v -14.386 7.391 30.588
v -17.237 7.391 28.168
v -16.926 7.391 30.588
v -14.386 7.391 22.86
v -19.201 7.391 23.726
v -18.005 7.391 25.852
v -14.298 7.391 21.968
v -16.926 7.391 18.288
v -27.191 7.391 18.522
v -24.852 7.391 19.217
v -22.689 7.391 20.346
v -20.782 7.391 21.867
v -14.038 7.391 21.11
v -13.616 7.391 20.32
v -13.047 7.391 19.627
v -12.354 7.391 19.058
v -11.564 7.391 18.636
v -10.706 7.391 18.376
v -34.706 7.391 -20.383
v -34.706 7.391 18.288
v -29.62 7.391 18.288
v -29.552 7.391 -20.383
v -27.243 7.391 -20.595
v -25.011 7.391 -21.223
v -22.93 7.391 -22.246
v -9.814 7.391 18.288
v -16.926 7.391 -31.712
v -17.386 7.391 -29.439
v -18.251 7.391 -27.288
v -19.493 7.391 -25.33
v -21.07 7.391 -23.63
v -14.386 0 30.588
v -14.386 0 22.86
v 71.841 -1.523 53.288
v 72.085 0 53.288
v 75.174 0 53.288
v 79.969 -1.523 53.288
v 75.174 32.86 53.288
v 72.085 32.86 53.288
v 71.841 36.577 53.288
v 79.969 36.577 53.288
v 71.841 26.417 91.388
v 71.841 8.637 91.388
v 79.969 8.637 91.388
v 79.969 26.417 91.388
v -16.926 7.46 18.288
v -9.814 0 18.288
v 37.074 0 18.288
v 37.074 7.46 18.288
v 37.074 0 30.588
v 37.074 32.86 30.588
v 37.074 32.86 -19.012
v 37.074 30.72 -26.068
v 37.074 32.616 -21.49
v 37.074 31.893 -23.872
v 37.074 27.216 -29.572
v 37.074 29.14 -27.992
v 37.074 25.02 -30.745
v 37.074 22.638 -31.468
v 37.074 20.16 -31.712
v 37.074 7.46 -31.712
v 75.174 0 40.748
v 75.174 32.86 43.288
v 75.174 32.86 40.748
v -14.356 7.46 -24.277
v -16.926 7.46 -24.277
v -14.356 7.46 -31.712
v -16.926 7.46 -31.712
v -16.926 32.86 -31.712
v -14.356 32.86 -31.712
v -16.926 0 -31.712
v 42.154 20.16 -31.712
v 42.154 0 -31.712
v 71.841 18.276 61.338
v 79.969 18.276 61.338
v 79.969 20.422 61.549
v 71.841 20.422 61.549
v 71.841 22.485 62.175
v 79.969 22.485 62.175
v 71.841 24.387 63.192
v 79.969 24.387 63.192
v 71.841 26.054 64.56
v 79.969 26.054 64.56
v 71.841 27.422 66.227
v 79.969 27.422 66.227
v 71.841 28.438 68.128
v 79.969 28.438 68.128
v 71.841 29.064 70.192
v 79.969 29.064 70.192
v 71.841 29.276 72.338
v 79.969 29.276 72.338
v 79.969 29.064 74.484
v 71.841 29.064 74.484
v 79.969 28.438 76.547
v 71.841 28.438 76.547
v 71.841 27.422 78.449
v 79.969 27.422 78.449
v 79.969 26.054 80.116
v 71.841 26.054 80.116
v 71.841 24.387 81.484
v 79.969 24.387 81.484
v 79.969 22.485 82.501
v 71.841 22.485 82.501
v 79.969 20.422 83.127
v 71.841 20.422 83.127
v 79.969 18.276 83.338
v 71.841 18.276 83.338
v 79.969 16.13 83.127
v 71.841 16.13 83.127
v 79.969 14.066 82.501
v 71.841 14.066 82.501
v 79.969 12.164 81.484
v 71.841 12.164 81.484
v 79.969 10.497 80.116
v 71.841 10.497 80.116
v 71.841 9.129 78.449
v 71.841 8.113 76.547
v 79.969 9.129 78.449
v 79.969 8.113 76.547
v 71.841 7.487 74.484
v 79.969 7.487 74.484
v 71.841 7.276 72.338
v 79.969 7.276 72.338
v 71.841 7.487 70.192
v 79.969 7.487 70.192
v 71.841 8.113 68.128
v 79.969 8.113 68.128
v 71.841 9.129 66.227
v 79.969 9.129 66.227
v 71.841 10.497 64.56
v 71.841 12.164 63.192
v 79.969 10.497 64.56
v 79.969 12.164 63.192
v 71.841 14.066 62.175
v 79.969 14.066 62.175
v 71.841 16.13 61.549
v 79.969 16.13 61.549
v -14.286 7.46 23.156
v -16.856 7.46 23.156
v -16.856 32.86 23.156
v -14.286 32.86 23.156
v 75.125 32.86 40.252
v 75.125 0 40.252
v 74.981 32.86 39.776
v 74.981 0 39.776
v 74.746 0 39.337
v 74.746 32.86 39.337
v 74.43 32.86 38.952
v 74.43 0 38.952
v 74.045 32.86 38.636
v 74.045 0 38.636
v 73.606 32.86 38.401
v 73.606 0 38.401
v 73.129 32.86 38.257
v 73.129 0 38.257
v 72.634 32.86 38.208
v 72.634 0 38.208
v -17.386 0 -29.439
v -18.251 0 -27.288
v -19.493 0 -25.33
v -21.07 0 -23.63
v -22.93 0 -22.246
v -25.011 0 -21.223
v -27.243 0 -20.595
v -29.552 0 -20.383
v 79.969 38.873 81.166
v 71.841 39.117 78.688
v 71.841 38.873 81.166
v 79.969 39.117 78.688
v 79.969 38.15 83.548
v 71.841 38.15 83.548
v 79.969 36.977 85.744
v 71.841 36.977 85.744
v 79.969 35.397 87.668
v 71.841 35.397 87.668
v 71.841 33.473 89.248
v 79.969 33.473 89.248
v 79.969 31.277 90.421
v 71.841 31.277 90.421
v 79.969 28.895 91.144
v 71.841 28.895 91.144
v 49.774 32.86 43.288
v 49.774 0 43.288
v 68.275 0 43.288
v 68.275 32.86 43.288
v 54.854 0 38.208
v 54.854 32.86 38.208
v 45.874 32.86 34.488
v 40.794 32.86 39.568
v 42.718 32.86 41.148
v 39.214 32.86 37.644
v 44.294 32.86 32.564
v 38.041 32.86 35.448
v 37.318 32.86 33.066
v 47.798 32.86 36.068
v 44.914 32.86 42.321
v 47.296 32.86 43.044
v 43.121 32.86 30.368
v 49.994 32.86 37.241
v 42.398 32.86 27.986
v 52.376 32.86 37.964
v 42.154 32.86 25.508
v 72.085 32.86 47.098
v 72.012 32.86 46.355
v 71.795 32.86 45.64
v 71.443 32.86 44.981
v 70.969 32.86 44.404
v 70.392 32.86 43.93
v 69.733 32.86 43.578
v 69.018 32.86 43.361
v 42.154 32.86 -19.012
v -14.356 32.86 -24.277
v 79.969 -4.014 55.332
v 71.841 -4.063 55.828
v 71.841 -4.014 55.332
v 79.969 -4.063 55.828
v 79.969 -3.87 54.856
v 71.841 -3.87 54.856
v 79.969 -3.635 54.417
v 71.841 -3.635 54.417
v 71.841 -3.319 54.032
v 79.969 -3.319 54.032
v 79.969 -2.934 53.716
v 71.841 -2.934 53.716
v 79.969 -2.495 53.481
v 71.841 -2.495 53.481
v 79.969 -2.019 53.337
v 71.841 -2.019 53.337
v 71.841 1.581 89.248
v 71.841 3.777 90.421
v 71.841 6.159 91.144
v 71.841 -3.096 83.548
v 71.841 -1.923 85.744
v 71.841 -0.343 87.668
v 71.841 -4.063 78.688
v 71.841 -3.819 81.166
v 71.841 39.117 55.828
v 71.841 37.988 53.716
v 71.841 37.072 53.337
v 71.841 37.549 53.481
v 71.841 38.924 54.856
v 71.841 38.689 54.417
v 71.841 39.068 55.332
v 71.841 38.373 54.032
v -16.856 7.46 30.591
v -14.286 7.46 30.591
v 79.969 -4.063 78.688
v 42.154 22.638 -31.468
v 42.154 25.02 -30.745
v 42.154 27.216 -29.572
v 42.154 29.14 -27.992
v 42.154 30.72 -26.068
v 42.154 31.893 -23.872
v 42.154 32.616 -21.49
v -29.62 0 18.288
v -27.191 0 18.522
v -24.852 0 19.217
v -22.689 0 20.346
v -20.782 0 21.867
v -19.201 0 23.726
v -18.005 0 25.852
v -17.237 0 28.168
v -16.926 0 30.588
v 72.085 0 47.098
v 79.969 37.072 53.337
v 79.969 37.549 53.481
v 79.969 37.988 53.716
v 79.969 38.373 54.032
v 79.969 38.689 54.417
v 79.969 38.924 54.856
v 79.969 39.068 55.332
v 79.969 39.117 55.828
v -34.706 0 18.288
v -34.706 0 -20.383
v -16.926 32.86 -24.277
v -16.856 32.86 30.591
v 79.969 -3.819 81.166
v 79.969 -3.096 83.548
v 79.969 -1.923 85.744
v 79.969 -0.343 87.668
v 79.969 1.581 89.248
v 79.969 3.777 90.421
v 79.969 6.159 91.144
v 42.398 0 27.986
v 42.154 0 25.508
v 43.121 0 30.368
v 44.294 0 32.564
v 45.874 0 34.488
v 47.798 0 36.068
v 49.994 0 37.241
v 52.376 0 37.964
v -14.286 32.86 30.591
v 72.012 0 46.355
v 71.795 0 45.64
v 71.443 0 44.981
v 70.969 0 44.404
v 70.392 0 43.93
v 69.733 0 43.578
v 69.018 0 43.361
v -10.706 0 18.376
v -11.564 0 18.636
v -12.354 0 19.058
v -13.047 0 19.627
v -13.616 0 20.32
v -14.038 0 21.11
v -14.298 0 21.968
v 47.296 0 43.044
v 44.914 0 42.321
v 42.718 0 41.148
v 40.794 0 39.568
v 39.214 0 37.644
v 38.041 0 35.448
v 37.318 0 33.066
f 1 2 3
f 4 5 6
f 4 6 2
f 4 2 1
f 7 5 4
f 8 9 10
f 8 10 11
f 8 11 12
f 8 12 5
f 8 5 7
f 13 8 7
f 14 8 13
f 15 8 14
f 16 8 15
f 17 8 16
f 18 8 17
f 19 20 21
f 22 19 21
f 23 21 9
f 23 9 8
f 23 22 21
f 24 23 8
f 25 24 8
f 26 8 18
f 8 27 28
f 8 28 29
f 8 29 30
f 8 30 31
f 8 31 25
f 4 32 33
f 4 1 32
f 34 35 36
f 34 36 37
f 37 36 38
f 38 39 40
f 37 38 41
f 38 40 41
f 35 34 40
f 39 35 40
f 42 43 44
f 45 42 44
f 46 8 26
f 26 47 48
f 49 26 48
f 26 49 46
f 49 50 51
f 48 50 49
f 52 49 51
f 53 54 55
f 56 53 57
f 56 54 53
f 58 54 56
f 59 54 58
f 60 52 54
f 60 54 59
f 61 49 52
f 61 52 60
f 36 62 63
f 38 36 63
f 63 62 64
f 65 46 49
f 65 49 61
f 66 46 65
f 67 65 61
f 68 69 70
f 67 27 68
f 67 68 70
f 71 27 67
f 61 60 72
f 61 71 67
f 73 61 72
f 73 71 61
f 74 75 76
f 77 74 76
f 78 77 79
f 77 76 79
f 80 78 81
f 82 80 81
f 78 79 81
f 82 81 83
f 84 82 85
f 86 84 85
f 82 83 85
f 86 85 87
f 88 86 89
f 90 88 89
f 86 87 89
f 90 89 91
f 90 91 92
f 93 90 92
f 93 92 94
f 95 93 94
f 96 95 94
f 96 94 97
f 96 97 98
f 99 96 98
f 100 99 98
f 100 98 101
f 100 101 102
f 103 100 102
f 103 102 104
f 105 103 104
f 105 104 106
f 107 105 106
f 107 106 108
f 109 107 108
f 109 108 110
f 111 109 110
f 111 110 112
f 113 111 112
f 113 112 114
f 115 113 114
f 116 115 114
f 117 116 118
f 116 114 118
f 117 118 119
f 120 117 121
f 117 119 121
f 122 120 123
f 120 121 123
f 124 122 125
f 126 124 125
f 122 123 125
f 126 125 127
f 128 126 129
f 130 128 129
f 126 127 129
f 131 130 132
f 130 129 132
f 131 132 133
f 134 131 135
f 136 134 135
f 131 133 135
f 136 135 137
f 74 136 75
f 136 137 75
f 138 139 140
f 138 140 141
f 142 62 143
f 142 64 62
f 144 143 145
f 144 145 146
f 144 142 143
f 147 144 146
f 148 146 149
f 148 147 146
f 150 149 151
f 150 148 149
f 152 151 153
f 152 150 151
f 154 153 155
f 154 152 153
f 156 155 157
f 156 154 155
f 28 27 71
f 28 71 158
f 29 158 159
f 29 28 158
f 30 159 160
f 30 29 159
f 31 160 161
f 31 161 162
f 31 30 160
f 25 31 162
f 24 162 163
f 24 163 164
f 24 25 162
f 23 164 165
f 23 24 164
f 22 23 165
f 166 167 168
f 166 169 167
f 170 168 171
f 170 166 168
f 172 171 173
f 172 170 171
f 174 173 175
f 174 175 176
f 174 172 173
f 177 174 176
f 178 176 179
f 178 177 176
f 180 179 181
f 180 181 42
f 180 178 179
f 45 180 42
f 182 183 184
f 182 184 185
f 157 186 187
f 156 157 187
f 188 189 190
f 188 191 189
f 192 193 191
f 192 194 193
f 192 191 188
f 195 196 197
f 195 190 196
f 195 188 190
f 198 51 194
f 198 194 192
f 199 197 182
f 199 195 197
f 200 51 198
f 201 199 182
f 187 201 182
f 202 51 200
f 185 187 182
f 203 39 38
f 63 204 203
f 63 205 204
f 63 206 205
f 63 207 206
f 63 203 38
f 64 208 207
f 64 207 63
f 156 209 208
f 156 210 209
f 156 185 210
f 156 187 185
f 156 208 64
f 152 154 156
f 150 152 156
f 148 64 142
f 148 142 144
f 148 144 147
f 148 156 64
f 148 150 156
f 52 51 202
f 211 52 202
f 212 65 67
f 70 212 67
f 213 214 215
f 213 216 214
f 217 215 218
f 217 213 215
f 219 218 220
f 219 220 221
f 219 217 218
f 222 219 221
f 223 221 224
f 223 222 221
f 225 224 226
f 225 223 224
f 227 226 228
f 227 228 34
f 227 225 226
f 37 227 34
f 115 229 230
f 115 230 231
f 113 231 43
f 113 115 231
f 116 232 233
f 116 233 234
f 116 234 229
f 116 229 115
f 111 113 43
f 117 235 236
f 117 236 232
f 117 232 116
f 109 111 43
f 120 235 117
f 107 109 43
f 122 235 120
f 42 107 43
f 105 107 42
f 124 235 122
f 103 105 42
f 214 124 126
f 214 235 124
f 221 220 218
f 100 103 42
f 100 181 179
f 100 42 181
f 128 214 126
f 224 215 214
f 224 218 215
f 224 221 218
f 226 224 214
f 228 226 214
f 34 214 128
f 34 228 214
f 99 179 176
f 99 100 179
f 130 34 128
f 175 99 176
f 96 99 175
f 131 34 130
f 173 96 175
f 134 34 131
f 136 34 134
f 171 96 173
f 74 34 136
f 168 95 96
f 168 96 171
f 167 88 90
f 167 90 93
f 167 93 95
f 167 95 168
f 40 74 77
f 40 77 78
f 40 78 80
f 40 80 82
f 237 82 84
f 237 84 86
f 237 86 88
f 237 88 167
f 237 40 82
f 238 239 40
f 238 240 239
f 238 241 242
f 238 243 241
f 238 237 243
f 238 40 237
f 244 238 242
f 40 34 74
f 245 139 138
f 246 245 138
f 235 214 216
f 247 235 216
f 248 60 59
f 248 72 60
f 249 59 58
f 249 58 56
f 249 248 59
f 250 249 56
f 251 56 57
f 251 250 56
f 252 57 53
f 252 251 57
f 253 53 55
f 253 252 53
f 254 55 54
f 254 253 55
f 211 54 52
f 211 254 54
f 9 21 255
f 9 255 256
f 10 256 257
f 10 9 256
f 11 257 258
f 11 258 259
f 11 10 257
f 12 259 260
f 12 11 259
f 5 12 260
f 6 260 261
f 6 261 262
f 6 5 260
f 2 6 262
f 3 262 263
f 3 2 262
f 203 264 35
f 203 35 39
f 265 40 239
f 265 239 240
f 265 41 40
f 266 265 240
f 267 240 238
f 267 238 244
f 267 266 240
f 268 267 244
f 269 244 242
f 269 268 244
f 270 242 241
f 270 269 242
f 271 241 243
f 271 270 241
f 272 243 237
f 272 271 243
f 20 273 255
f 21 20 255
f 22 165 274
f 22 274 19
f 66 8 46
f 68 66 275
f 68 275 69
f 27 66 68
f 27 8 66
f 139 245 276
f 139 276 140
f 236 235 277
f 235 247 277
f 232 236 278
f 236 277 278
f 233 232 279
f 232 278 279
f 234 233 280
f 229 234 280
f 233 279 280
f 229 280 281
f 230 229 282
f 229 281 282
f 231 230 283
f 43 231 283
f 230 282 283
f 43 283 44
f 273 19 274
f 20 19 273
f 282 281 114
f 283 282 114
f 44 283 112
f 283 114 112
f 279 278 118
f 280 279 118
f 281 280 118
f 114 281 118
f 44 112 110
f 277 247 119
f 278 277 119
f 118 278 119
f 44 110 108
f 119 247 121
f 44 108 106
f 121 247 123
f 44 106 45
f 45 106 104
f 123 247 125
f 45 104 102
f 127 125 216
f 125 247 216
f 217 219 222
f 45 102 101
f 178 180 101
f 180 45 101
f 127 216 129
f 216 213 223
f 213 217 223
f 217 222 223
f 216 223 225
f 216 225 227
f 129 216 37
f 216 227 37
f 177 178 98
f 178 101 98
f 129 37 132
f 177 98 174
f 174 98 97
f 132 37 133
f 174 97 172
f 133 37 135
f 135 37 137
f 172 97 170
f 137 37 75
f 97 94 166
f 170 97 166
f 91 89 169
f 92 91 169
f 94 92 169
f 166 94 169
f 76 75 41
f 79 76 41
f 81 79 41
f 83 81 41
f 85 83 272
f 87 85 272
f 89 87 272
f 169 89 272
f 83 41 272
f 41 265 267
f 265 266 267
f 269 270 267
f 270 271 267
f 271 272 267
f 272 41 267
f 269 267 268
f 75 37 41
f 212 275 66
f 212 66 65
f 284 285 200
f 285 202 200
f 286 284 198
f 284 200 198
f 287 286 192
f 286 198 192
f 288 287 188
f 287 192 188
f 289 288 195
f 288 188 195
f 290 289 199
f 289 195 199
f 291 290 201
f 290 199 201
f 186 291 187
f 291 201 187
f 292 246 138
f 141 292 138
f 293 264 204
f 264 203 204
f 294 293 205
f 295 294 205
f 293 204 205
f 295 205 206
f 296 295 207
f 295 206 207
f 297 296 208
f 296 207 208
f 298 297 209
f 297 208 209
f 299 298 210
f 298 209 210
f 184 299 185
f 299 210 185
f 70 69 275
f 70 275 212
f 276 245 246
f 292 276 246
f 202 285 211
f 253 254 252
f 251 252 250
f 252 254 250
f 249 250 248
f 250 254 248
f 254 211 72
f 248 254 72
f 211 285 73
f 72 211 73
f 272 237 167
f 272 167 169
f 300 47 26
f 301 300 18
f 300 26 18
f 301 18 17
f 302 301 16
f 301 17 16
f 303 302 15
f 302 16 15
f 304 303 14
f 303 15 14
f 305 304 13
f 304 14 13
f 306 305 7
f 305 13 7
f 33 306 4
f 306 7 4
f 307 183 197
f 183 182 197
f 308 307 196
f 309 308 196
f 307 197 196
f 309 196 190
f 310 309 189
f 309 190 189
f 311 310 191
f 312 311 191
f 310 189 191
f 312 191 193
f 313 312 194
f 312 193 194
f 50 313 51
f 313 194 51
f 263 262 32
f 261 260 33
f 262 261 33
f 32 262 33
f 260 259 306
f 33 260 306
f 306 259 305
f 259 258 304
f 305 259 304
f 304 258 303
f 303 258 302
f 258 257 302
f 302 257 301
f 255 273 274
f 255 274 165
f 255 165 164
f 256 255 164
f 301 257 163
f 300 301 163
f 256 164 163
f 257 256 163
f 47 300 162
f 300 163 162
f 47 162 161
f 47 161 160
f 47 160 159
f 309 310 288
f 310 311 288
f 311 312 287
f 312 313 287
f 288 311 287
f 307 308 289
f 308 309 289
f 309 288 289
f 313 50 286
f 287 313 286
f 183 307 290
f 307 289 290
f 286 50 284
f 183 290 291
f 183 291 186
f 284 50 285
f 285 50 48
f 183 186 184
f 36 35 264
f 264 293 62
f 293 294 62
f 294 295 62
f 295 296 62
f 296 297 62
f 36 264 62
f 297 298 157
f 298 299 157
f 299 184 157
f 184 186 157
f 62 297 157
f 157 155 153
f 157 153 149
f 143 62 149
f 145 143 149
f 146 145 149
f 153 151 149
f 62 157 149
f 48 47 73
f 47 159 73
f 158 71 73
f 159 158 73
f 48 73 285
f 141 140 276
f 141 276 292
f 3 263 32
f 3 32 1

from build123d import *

# Parameters (mm, degrees)
SKETCH1_W            = 54
SKETCH1_H            = 50
BOSS_EXTRUDE1_DEPTH  = 7.460000066
SKETCH2_W            = 75
SKETCH2_H            = 7.460000066
BOSS_EXTRUDE2_DEPTH  = 5.08
SKETCH4_W            = 5.08
SKETCH4_H            = 75
BOSS_EXTRUDE3_DEPTH  = 25.4
FILLET1_R            = 12.7
SKETCH6_W            = 5.08
SKETCH6_H            = 32.860000066
BOSS_EXTRUDE4_DEPTH  = 33.02
FILLET2_R            = 12.7
FILLET3_R            = 12.7
SKETCH9_W            = 3.089134775
SKETCH9_H            = 32.860000066
BOSS_EXTRUDE5_DEPTH  = 10
SKETCH10_W           = 8.128
SKETCH10_H           = 43.18
BOSS_EXTRUDE6_DEPTH  = 38.1
FILLET4_R            = 12.7
FILLET5_R            = 2.54
SKETCH11_R           = 11
CUT_EXTRUDE1_DEPTH   = 38.1
FILLET6_R            = 2.54
FILLET7_R            = 3.81
SKETCH18_W           = 50.970977204
SKETCH18_H           = 7.39100176
BOSS_EXTRUDE8_DEPTH  = 17.78
FILLET12_R           = 12.7
SKETCH23_W           = 12.3
SKETCH23_H           = 7.39100176
BOSS_EXTRUDE9_DEPTH  = 7.62
SKETCH24_W           = 2.569580913
SKETCH24_H           = 7.435441969
BOSS_EXTRUDE10_DEPTH = 25.4
SKETCH28_W           = 17.78
SKETCH28_H           = 12.3
CUT_EXTRUDE8_DEPTH   = 25.4
FILLET14_R           = 12.7
SKETCH30_W           = 12.3
SKETCH30_H           = 7.39100176
CUT_EXTRUDE9_DEPTH   = 5.08
FILLET16_R           = 4.572


with BuildPart() as part:
    # Sketch1 → Boss-Extrude1 (new body)
    with BuildSketch(Plane(origin=(0, 0, 0), x_dir=(1, 0, 0), z_dir=(0, 1, 0))):
        with Locations((10.073929961, 6.712062257)):
            Rectangle(SKETCH1_W, SKETCH1_H)
    extrude(amount=BOSS_EXTRUDE1_DEPTH)

    # Sketch2 → Boss-Extrude2 (add)
    with BuildSketch(Plane(origin=(37.073929961, 0, 0), x_dir=(0, 0, -1), z_dir=(1, 0, 0))):
        with Locations((-5.787937743, 3.730000033)):
            Rectangle(SKETCH2_W, SKETCH2_H)
    extrude(amount=BOSS_EXTRUDE2_DEPTH)

    # Sketch4 → Boss-Extrude3 (add)
    with BuildSketch(Plane(origin=(0, 7.460000066, 0), x_dir=(1, 0, 0), z_dir=(0, 1, 0))):
        with Locations((39.613929961, -5.787937743)):
            Rectangle(SKETCH4_W, SKETCH4_H)
    extrude(amount=BOSS_EXTRUDE3_DEPTH)

    # Fillet1
    fillet1_edges = [part.edges().sort_by_distance(p)[0] for p in [
        (39.613929961, 32.860000066, -31.712062257),
    ]]
    fillet(fillet1_edges, radius=FILLET1_R)

    # Sketch6 → Boss-Extrude4 (add)
    with BuildSketch(Plane(origin=(42.153929961, 0, 0), x_dir=(0, 0, -1), z_dir=(1, 0, 0))):
        with Locations((-40.747937743, 16.430000033)):
            Rectangle(SKETCH6_W, SKETCH6_H)
    extrude(amount=BOSS_EXTRUDE4_DEPTH)

    # Fillet2
    fillet2_edges = [part.edges().sort_by_distance(p)[0] for p in [
        (42.153929961, 16.430000033, 38.207937743),
    ]]
    fillet(fillet2_edges, radius=FILLET2_R)

    # Fillet3
    fillet3_edges = [part.edges().sort_by_distance(p)[0] for p in [
        (37.073929961, 16.430000033, 43.287937743),
    ]]
    fillet(fillet3_edges, radius=FILLET3_R)

    # Sketch9 → Boss-Extrude5 (add)
    with BuildSketch(Plane.XY.offset(43.287937743)):
        with Locations((73.629362574, 16.430000033)):
            Rectangle(SKETCH9_W, SKETCH9_H)
    extrude(amount=BOSS_EXTRUDE5_DEPTH)

    # Sketch10 → Boss-Extrude6 (add)
    with BuildSketch(Plane.XY.offset(53.287937743)):
        with Locations((75.90492166, 17.526882494)):
            Rectangle(SKETCH10_W, SKETCH10_H)
    extrude(amount=BOSS_EXTRUDE6_DEPTH)

    # Fillet4
    fillet4_edges = [part.edges().sort_by_distance(p)[0] for p in [
        (75.90492166, 39.116882494, 91.387937743),
        (75.90492166, -4.063117506, 91.387937743),
    ]]
    fillet(fillet4_edges, radius=FILLET4_R)

    # Fillet5
    fillet5_edges = [part.edges().sort_by_distance(p)[0] for p in [
        (75.90492166, 39.116882494, 53.287937743),
        (75.90492166, -4.063117506, 53.287937743),
    ]]
    fillet(fillet5_edges, radius=FILLET5_R)

    # Sketch11 → Cut-Extrude1 (cut)
    with BuildSketch(Plane(origin=(79.96892166, 0, 0), x_dir=(0, 0, -1), z_dir=(1, 0, 0))):
        with Locations((-72.337937743, 18.275557959)):
            Circle(SKETCH11_R)
    extrude(amount=-CUT_EXTRUDE1_DEPTH, mode=Mode.SUBTRACT)

    # Fillet6
    fillet6_edges = [part.edges().sort_by_distance(p)[0] for p in [
        (75.173929961, 16.430000033, 38.207937743),
    ]]
    fillet(fillet6_edges, radius=FILLET6_R)

    # Fillet7
    fillet7_edges = [part.edges().sort_by_distance(p)[0] for p in [
        (72.084795186, 16.430000033, 43.287937743),
    ]]
    fillet(fillet7_edges, radius=FILLET7_R)

    # Sketch18 → Boss-Extrude8 (add)
    with BuildSketch(Plane.ZY.offset(16.926070039)):
        with Locations((5.102449141, 3.69550088)):
            Rectangle(SKETCH18_W, SKETCH18_H)
    extrude(amount=BOSS_EXTRUDE8_DEPTH)

    # Fillet12
    # the kernel refuses this fillet: 12.7 mm, written as the material it adds along each edge
    with BuildSketch(Plane(origin=(-16.926070039, 7.39100176, -20.383039461), x_dir=(0, 0, -1), z_dir=(0, -1, 0))) as fillet12_piece_1:
        with BuildLine():
            CenterArc((12.7, -12.625783996), FILLET12_R, 96.197210877, 83.802789123)
            Line((0, -12.625783996), (-0.254, -12.625783996))
            Line((-0.254, -12.625783996), (-0.254, 0))
            Line((-0.254, 0), (0, 0.254))
            ThreePointArc((0, 0.254), (5.664511398, 0.254), (11.301603252, 0.25251568))
            Line((11.301603252, 0.25251568), (11.329022796, 0))
        make_face()
    extrude(amount=7.39100176)

    # Sketch23 → Boss-Extrude9 (add)
    with BuildSketch(Plane(origin=(-16.926070039, 0, 0), x_dir=(0, 0, -1), z_dir=(1, 0, 0))):
        with Locations((-24.437937743, 3.69550088)):
            Rectangle(SKETCH23_W, SKETCH23_H)
    extrude(amount=BOSS_EXTRUDE9_DEPTH)

    # Sketch24 → Boss-Extrude10 (add)
    with BuildSketch(Plane(origin=(0, 7.460000066, 0), x_dir=(1, 0, 0), z_dir=(0, 1, 0))):
        with Locations((-15.641279583, 27.994341273)):
            Rectangle(SKETCH24_W, SKETCH24_H)
        with Locations((-15.571212374, -26.873353003)):
            Rectangle(SKETCH24_W, SKETCH24_H)
    extrude(amount=BOSS_EXTRUDE10_DEPTH)


with BuildPart() as boss_extrude10_piece_1:
    # of the separate pieces the step leaves, piece 1, a body of its own (boss_extrude10_pieces)
    add(part.part.solids().sort_by_distance((-16.926070039, 0, -31.712062257))[0])

    # Sketch28 → Cut-Extrude8 (cut)
    with BuildSketch(Plane(origin=(0, 7.39100176, 0), x_dir=(1, 0, 0), z_dir=(0, 1, 0))):
        with Locations((-25.816070039, -24.437937743)):
            Rectangle(SKETCH28_W, SKETCH28_H)
    extrude(amount=-CUT_EXTRUDE8_DEPTH, mode=Mode.SUBTRACT)

    # Fillet14
    # the kernel refuses this fillet: 12.7 mm, written as the material it adds along each edge
    with BuildSketch(Plane(origin=(-16.926070039, 7.39100176, 18.287937743), x_dir=(-1, 0, 0), z_dir=(0, -1, 0))) as fillet14_piece_1:
        with BuildLine():
            CenterArc((12.693699224, -12.7), FILLET14_R, 90, 88.195110026)
            Line((0, -12.3), (-0.253873984, -12.292))
            ThreePointArc((-0.253873984, -12.292), (-0.254, -6.15), (-0.254, 0))
            Line((-0.254, 0), (0, 0.254))
            Line((0, 0.254), (12.693699224, 0.254))
            Line((12.693699224, 0.254), (12.693699224, 0))
        make_face()
    extrude(amount=7.39100176)

    # Sketch30 → Cut-Extrude9 (cut)
    with BuildSketch(Plane(origin=(-9.306070039, 0, 0), x_dir=(0, 0, -1), z_dir=(1, 0, 0))):
        with Locations((-24.437937743, 3.69550088)):
            Rectangle(SKETCH30_W, SKETCH30_H)
    extrude(amount=-CUT_EXTRUDE9_DEPTH, mode=Mode.SUBTRACT)

    # Fillet16
    fillet16_edges = [boss_extrude10_piece_1.edges().sort_by_distance(p)[0] for p in [
        (-14.386070039, 3.69550088, 18.287937743),
    ]]
    fillet(fillet16_edges, radius=FILLET16_R)


with BuildPart() as boss_extrude10_piece_2:
    # of the separate pieces the step leaves, piece 2, a body of its own (boss_extrude10_pieces)
    add(part.part.solids().sort_by_distance((-16.856002831, 7.460000066, 23.155632018))[0])


solid = Compound([boss_extrude10_piece_1.part, boss_extrude10_piece_2.part])
